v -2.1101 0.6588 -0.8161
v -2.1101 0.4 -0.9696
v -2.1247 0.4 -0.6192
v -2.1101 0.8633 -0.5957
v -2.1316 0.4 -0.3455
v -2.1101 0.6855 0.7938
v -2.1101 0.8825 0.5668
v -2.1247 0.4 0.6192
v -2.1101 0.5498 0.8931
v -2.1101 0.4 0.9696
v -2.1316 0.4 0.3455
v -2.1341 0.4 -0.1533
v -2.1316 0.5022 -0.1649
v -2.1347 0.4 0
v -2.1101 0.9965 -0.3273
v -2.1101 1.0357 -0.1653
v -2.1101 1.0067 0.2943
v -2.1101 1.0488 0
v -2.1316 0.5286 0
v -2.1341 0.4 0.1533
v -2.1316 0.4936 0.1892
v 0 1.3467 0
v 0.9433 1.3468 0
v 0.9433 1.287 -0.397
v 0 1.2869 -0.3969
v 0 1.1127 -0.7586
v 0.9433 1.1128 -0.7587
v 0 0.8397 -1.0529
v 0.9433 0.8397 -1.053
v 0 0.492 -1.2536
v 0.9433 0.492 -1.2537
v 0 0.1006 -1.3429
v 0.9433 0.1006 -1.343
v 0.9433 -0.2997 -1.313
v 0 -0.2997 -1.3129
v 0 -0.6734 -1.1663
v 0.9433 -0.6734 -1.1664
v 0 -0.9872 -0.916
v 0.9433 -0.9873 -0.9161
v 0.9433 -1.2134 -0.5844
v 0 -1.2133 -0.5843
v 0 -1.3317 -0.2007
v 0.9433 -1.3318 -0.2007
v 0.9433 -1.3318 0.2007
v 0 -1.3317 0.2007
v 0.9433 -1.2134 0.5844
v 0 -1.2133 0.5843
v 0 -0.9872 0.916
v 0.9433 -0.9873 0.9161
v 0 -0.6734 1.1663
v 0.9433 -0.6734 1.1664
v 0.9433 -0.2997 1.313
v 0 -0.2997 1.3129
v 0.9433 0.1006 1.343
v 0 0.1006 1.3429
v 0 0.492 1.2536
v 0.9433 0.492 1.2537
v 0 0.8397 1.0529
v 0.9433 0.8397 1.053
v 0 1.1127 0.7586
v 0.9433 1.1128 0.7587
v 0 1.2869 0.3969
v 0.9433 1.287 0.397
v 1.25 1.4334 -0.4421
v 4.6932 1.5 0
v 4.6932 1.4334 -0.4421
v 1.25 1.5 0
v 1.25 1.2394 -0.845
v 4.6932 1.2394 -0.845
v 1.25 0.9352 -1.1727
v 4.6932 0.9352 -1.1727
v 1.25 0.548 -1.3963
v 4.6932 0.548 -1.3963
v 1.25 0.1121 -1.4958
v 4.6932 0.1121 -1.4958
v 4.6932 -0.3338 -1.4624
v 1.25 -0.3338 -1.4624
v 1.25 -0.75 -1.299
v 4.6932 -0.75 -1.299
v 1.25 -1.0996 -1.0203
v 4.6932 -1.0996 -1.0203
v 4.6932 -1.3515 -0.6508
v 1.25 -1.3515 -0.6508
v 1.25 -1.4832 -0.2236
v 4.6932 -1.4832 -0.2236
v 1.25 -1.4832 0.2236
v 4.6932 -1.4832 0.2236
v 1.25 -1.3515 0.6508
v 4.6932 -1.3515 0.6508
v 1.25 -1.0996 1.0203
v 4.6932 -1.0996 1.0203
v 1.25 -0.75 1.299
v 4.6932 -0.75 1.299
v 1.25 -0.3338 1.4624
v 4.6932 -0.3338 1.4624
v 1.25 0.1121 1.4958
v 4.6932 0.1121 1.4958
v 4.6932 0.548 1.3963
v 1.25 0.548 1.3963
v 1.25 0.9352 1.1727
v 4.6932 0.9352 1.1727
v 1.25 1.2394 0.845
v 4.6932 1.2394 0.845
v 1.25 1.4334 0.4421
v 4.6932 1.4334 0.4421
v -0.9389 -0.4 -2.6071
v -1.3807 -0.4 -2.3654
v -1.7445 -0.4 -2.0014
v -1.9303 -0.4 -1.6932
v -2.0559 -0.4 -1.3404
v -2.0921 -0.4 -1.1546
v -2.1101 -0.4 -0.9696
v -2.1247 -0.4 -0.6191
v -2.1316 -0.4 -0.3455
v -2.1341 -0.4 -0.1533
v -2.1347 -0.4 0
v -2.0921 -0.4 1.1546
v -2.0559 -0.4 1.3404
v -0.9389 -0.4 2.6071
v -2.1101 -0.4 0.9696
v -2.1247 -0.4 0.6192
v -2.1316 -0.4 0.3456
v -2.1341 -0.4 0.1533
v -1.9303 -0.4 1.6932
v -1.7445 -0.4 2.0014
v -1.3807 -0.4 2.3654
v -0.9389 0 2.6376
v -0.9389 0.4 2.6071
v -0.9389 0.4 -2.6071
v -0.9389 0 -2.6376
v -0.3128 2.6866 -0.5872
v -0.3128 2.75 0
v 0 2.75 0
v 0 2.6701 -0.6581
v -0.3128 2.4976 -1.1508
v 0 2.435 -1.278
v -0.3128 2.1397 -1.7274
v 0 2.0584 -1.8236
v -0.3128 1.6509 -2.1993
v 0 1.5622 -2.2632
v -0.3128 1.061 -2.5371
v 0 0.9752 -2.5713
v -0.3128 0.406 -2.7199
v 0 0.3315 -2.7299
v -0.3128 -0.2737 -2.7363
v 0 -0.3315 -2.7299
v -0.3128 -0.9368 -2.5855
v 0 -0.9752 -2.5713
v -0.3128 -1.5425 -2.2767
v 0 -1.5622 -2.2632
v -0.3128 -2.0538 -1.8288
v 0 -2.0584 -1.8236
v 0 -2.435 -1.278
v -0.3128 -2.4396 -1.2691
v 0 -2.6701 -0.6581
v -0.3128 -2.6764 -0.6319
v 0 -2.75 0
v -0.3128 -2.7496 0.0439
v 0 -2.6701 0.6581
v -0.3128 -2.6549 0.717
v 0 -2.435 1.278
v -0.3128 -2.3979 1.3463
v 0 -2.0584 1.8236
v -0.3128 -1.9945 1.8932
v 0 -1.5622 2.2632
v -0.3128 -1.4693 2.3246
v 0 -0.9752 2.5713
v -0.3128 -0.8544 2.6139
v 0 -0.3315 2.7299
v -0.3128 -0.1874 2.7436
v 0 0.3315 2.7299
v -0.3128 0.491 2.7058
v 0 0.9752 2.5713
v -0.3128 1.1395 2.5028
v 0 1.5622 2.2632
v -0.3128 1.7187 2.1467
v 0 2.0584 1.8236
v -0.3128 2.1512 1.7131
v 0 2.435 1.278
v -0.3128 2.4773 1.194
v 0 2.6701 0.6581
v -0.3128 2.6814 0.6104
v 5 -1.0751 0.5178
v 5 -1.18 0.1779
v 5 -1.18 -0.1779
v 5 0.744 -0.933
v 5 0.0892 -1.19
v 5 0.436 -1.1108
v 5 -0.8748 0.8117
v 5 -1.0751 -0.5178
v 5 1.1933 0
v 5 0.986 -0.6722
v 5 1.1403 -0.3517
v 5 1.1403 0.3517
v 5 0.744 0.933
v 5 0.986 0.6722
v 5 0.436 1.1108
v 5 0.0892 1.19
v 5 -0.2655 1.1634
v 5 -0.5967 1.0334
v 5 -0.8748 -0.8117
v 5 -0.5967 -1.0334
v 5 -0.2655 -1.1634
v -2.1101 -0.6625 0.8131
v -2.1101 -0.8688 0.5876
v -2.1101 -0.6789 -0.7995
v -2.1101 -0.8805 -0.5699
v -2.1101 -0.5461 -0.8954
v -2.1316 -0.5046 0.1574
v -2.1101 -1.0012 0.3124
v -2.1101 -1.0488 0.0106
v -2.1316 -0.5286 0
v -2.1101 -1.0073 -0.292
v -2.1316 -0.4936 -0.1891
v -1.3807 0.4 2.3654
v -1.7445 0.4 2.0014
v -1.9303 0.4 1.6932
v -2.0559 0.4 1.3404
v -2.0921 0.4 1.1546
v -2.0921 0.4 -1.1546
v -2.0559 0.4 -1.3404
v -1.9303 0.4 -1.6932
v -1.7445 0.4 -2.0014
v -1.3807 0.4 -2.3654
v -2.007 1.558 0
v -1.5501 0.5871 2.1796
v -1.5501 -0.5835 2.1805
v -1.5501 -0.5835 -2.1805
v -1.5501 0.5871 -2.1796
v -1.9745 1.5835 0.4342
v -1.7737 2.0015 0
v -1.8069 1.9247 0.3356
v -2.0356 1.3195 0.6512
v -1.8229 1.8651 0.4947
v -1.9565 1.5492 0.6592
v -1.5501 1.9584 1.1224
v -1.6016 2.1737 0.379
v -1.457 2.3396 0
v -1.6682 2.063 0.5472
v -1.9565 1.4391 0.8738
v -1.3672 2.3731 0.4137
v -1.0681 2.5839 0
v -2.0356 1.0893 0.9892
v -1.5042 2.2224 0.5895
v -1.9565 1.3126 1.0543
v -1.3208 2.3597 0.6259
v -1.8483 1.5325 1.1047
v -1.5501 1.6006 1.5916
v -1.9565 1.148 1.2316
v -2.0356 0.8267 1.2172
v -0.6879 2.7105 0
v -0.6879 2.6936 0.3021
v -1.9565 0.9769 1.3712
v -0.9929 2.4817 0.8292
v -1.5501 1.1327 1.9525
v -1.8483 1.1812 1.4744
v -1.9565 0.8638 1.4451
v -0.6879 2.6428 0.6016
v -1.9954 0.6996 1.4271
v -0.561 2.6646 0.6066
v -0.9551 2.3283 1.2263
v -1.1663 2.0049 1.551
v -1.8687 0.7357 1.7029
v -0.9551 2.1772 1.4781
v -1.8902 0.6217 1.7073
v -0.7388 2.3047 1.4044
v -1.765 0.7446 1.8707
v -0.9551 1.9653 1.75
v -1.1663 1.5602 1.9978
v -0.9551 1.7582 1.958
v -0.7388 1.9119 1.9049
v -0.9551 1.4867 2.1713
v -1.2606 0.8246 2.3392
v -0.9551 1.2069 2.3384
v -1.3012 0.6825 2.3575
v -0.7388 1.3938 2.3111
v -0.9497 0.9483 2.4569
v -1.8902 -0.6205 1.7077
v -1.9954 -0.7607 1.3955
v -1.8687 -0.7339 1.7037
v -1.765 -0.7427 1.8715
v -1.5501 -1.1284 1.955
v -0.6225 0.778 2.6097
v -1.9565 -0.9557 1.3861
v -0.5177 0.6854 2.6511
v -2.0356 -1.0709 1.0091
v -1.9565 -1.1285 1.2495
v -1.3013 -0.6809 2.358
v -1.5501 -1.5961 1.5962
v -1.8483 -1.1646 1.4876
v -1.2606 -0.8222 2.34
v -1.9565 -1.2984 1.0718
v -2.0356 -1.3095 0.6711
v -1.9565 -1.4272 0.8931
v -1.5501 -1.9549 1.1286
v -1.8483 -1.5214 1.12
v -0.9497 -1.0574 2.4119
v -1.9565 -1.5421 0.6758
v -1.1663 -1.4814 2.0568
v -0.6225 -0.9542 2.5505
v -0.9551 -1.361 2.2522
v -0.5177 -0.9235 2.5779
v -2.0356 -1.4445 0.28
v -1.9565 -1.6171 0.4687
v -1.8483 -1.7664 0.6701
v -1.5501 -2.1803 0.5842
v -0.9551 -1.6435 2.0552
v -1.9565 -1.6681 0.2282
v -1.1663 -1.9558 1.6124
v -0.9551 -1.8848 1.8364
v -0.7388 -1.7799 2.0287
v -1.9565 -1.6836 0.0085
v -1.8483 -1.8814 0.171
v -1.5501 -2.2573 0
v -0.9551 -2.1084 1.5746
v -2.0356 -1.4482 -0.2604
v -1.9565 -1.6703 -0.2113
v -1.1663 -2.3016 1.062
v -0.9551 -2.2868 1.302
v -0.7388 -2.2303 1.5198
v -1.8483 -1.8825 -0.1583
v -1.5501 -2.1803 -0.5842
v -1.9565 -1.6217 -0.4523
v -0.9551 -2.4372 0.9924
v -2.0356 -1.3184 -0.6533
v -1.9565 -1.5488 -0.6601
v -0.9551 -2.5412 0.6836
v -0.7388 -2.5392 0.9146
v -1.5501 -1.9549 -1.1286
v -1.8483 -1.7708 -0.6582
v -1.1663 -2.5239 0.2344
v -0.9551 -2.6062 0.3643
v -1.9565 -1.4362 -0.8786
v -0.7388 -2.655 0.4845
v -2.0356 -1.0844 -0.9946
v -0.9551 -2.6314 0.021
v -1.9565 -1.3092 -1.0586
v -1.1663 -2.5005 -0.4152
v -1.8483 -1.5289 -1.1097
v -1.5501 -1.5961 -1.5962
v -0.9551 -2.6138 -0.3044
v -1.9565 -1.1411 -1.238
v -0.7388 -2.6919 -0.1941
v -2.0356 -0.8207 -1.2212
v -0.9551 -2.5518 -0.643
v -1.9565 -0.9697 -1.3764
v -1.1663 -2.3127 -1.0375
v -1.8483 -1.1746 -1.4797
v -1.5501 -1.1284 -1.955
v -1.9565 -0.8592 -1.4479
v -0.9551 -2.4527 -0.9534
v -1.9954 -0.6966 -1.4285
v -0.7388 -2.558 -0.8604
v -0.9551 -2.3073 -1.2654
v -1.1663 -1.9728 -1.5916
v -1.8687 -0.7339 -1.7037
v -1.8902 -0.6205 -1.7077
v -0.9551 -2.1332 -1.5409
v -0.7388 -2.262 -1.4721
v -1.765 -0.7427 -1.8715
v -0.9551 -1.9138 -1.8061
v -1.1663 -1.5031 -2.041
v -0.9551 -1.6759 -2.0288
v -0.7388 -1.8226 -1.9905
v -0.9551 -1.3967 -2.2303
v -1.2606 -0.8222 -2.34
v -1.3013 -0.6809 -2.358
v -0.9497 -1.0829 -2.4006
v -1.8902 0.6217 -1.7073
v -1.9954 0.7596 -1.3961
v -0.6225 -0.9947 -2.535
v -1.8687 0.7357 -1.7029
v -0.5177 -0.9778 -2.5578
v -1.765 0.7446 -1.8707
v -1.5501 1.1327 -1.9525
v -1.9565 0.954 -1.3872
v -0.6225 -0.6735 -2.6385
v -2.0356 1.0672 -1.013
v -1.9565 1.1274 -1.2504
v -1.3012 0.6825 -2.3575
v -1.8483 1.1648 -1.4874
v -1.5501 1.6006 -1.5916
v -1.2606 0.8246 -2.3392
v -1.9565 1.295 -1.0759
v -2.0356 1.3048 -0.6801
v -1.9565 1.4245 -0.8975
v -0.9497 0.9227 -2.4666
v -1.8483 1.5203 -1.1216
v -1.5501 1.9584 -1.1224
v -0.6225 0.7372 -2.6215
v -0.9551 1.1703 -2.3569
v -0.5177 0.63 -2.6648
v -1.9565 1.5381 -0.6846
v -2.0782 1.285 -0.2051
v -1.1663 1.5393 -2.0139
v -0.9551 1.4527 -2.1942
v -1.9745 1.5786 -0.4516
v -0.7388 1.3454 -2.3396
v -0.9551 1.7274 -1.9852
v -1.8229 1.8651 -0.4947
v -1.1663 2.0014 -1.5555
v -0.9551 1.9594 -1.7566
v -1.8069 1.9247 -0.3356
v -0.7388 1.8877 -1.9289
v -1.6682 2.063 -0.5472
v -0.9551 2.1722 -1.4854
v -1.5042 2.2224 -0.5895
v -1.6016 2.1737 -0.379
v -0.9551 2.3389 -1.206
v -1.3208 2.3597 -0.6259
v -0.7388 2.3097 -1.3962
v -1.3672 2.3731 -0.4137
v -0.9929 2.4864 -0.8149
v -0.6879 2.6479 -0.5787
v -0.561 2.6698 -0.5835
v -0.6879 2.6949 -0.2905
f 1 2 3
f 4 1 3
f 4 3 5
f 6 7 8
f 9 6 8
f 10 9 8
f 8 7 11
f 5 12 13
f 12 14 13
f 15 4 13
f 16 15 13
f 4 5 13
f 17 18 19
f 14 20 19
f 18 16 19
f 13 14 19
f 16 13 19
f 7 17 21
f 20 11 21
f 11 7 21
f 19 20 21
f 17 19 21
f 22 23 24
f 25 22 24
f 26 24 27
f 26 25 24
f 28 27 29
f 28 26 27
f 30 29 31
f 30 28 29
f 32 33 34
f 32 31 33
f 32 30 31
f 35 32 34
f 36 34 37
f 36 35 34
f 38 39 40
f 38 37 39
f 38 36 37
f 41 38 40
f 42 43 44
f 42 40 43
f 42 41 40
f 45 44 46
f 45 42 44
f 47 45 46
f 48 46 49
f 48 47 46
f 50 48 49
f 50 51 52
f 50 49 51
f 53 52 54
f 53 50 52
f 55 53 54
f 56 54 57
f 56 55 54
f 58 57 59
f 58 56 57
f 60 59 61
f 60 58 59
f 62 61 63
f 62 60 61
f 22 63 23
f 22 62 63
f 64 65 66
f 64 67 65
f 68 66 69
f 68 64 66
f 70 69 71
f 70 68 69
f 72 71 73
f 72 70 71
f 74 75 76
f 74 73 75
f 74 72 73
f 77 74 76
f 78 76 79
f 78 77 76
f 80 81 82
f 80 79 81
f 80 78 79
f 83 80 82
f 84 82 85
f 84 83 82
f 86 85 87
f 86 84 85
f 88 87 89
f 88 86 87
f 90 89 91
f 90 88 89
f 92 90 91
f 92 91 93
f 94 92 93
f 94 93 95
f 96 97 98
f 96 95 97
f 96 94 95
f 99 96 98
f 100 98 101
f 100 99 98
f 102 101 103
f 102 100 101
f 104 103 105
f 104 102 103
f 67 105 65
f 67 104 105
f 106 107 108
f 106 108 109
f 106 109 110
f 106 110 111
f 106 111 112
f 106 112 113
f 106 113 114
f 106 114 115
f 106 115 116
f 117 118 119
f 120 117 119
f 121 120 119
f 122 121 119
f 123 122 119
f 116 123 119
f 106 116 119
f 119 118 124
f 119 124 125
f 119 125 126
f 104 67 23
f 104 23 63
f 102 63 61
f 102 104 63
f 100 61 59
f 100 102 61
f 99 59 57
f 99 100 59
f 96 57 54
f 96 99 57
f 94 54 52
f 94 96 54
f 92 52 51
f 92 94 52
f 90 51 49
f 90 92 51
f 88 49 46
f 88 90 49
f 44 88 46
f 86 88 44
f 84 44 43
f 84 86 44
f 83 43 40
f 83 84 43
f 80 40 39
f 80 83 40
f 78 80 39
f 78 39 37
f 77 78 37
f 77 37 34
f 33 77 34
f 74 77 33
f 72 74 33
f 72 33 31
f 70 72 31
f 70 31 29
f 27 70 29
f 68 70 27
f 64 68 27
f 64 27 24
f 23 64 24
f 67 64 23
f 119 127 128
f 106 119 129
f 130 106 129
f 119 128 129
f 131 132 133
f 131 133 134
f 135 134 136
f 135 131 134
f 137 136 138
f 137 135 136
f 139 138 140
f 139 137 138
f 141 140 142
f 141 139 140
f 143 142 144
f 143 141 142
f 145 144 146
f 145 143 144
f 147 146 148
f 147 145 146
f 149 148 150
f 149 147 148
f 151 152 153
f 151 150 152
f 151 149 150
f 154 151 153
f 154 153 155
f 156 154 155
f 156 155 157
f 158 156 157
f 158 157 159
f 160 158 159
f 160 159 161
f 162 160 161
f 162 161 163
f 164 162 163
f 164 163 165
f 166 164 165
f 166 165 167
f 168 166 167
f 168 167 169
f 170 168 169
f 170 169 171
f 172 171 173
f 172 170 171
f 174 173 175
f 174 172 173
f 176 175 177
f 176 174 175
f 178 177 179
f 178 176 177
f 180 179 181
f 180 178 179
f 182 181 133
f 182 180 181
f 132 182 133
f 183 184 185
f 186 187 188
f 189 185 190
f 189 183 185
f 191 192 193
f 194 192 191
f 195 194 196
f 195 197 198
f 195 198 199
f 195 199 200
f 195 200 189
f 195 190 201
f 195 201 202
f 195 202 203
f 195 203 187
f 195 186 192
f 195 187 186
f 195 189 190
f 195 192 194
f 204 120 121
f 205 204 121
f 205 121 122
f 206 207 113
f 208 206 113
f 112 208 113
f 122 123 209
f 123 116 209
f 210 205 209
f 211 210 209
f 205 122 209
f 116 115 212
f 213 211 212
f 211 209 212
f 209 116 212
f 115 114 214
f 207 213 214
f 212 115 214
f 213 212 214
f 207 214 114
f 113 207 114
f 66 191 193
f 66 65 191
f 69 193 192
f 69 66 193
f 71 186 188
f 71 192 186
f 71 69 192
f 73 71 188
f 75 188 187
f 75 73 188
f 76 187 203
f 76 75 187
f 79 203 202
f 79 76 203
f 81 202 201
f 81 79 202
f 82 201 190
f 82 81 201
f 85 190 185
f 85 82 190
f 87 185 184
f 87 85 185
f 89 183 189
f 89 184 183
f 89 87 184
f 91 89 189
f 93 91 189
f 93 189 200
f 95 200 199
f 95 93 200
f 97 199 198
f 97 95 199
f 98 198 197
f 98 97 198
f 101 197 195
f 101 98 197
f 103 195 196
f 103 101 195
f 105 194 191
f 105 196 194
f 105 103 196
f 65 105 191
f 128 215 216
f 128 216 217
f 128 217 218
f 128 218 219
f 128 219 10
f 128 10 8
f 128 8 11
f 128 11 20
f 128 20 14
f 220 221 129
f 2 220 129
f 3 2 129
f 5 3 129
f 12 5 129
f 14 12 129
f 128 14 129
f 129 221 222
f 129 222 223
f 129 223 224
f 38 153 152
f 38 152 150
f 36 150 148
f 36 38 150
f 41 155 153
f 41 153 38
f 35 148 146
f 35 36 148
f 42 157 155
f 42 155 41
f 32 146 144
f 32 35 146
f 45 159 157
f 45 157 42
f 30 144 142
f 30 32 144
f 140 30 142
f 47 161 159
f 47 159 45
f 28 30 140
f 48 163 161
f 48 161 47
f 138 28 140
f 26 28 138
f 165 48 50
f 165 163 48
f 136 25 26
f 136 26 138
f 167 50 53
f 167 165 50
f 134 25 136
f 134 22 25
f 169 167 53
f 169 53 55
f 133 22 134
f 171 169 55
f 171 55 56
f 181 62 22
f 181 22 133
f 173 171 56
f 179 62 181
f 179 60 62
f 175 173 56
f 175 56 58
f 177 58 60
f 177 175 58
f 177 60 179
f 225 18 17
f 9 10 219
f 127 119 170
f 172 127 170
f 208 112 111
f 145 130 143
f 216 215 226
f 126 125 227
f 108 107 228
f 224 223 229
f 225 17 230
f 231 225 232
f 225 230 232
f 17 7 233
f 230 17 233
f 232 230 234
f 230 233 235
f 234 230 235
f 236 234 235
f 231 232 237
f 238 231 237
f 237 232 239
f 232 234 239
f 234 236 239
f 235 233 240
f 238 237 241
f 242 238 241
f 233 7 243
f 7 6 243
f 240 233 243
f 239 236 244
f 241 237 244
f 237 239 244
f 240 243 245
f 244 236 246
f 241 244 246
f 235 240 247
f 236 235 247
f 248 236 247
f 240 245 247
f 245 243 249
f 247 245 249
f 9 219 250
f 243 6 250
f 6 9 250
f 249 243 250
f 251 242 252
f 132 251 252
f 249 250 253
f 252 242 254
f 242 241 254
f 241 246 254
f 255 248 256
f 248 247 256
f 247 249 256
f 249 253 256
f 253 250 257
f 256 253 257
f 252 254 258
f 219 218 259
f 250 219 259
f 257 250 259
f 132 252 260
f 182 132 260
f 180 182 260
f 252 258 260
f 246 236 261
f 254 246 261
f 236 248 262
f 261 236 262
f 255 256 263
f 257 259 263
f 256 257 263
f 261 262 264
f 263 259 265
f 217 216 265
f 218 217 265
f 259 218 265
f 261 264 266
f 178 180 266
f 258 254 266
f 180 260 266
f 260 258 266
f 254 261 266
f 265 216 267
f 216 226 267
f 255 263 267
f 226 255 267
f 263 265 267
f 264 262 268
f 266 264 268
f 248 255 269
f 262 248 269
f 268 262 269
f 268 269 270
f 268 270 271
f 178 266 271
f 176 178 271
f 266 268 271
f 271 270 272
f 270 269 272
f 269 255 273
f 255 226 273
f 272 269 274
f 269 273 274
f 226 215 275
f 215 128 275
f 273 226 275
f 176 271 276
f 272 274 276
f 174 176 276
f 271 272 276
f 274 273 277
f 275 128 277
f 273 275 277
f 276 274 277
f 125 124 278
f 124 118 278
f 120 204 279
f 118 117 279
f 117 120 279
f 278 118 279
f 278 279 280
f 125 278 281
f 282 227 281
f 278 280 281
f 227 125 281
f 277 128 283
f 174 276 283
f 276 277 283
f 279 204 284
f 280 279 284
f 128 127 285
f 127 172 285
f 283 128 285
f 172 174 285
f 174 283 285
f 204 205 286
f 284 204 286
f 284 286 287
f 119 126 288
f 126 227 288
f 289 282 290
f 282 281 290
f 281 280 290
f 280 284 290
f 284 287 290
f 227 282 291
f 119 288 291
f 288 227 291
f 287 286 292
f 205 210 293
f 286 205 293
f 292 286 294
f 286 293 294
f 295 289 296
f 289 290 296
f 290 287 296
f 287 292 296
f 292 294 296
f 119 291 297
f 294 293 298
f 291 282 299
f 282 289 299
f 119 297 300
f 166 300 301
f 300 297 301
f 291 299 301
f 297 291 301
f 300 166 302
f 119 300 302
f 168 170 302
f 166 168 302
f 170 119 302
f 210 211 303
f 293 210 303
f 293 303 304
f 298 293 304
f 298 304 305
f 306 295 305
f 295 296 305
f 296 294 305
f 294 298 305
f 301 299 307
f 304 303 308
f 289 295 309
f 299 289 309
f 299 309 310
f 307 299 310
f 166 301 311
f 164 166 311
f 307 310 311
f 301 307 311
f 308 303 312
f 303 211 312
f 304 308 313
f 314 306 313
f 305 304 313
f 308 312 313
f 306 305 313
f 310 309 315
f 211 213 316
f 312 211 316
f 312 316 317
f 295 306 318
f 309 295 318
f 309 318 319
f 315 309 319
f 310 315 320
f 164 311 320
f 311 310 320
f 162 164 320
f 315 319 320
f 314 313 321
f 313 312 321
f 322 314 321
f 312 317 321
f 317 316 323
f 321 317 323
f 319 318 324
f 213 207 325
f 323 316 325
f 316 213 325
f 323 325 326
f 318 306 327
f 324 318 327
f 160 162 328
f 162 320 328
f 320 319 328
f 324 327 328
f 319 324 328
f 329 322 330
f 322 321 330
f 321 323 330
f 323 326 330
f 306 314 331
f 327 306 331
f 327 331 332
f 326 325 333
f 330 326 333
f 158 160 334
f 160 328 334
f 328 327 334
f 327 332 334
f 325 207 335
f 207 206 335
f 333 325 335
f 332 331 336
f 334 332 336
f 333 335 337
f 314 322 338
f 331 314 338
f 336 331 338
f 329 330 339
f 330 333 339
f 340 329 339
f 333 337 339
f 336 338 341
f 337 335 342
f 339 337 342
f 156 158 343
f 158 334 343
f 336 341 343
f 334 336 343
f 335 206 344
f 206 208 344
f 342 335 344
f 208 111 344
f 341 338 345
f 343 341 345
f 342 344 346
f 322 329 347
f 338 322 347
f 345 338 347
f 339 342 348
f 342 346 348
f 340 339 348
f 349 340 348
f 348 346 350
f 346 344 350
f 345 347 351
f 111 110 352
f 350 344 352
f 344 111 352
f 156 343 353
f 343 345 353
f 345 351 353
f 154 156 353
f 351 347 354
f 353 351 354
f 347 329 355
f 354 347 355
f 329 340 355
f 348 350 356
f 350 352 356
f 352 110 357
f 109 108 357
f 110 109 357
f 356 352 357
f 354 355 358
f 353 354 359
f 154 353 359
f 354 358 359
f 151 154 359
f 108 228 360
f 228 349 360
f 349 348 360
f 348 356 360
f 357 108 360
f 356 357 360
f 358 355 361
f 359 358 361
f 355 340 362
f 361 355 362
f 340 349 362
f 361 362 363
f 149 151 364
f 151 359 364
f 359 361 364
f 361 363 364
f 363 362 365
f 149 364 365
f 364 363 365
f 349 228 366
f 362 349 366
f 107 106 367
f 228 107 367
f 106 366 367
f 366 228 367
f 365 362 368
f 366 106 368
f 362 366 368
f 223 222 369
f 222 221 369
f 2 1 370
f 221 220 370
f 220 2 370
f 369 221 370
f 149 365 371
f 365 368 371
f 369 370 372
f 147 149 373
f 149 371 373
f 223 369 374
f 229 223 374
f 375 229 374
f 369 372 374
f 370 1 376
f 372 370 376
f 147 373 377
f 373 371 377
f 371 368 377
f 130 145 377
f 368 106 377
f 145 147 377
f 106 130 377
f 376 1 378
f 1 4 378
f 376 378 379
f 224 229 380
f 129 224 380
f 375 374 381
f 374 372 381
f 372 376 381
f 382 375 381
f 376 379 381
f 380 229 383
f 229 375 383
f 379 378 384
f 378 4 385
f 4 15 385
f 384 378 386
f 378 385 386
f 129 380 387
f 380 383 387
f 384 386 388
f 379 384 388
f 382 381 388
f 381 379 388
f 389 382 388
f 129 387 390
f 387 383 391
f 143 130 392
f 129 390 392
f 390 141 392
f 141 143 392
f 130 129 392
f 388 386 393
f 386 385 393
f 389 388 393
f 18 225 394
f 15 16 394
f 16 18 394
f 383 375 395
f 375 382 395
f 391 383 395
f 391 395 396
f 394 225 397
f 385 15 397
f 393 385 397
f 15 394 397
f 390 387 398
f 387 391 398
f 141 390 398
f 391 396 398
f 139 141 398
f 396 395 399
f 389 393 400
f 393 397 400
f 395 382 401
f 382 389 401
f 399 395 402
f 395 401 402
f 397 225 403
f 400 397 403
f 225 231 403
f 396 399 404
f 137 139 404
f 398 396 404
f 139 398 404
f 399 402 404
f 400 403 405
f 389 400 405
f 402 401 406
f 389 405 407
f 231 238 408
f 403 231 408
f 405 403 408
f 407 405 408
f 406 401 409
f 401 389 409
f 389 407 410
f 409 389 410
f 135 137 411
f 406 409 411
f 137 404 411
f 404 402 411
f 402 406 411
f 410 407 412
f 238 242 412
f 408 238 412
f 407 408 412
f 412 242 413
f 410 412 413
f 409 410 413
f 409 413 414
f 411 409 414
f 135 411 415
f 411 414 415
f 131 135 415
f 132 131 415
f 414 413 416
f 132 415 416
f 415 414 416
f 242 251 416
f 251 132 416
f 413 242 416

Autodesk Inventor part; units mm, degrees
ref_plane "YZ Plane" through (0, 0, 0) normal (1, 0, 0) x (0, 1, 0)
sketch "Skizze1" plane through (0, 0, 0) normal (0, 0, 1) x (1, 0, 0)
  line L0 (-2.1389, 0) -> (5, 0)
  line L1 (5, 0) -> (5, 1.5)
  line L2 (5, 1.5) -> (1.25, 1.5)
  line L3 (1.25, 1.5) -> (0.9433, 1.3468)
  line L4 (0.9433, 1.3468) -> (0, 1.3467)
  line L5 (0, 1.3467) -> (0, 2.75)
  line L6 (-6.0203, 0) -> (20.8022, 0) projected
  line L7 (0, -0.5507) -> (0, 3.3039) projected
  line L8 (0, 2.75) -> (-1.94, 2.7497)
  arc A0 (-1.94, 2.7497) -> (-2.1389, 0) centre (16.9704, 0) ccw
  dimension "d0" = 5
  dimension "d1" = 3.75
  dimension "d2" = 0.3067
  dimension "d3" = 2.1389
  dimension "d4" = 3
  dimension "d5" = 2.6935
  dimension "d9" = 5.5
  dimension "d10" = 0.01
  dimension "d15" = 19.1093
revolve "Körper" add sketch "Skizze1" angle 360 about axis through (-2.1389, 0, 0) along (1, 0, 0)
fillet "Rundung1" radius 1.8 1 edges at (-1.94, -2.7497, 0)
ref_plane "IDS_WORKPLANE{1}" through (-2.1389, 0, 0) normal (1, 0, 0) x (0, 0, -1)
sketch "Skizze2" plane through (-2.1389, 0, 0) normal (1, 0, 0) x (0, 0, -1)
  line L0 (0, -3.85) -> (0, 3.85) projected
  line L1 (3.85, 0) -> (-3.85, 0) projected
  line L2 (-2.75, 0.4) -> (2.75, 0.4)
  line L3 (2.75, 0.4) -> (2.75, -0.4)
  line L4 (2.75, -0.4) -> (-2.75, -0.4)
  line L5 (-2.75, -0.4) -> (-2.75, 0.4)
  line L6 (0, 0.4) -> (0, -0.4) construction
  line L7 (-2.75, 0) -> (2.75, 0) construction
  circle A0 centre (0, 0) radius 2.75 projected
  dimension "d17" = 0.8
extrude "Loch" cut sketch "Skizze2" along normal blind 1.2 contours L4 A0 L1 L0 | L0 L1 A0 L4 | L4 L5 A0 | A0 L3 L4 | L1 A0 L2 L0 | L0 L2 A0 L1 | L5 L2 A0 | A0 L2 L3
thread "Gewinde" size "M3x0.5" class "6g" standard "ISO Metric profile" length 3.75
chamfer "Fase1" distance 0.3067 distance2 0.3068 1 edges at (5, -1.5, 0) measured on face at (5, 0.8773, -0.3972)
ref_plane "Work Plane2" through (8.25, 0, 0) normal (0, 0, -1) x (1, 0, 0)
equation "\"d0\" = NLG"
equation "\"d1\" = GEL"
equation "\"d2\" = GAL"
equation "\"d3\" = KOH"
equation "\"d4\" = GD"
equation "\"d5\" = BDM"
equation "\"d9\" = KOD"
equation "\"d10\" = KEWI"
equation "\"d17\" = SBR"
equation "\"d18\" = STI"
equation "\"d20\" = RR"
equation "\"d11\" = GEL"
equation "\"d13\" = -0.5 * SPD + 0.5 * GD"
equation "\"GD\" = NND"
equation "\"NLG\" = 5"
equation "\"GEL\" = 3.75"
equation "\"KOD\" = 5.5"
equation "\"KOH\" = 2.13889"
equation "\"GAL\" = 0.61345 * PTC"
equation "\"SPD\" = NND - 1.2269 * PTC"
equation "\"BDM\" = 2.6935"
equation "\"GUL\" = 0.61345 * PTC"
equation "\"RR\" = 1.8"
equation "\"SBR\" = 0.8"
equation "\"STI\" = 1.2"
equation "\"KEWI\" = 0.01deg"
equation "\"KR\" = 3.3"
equation "\"d16\" = -KOH"
equation "\"PTC\" = 0.5"
equation "\"THREADDIA\" = 3"
equation "\"TOA\" = 30deg"
equation "\"NND\" = 3"
equation "\"ORI\" = 1.8"
equation "\"GD1\" = THREADDIA - 1.2269 * PTC"
properties part number "CNS 9671 - M3 x 5" material "Steel, Mild"
